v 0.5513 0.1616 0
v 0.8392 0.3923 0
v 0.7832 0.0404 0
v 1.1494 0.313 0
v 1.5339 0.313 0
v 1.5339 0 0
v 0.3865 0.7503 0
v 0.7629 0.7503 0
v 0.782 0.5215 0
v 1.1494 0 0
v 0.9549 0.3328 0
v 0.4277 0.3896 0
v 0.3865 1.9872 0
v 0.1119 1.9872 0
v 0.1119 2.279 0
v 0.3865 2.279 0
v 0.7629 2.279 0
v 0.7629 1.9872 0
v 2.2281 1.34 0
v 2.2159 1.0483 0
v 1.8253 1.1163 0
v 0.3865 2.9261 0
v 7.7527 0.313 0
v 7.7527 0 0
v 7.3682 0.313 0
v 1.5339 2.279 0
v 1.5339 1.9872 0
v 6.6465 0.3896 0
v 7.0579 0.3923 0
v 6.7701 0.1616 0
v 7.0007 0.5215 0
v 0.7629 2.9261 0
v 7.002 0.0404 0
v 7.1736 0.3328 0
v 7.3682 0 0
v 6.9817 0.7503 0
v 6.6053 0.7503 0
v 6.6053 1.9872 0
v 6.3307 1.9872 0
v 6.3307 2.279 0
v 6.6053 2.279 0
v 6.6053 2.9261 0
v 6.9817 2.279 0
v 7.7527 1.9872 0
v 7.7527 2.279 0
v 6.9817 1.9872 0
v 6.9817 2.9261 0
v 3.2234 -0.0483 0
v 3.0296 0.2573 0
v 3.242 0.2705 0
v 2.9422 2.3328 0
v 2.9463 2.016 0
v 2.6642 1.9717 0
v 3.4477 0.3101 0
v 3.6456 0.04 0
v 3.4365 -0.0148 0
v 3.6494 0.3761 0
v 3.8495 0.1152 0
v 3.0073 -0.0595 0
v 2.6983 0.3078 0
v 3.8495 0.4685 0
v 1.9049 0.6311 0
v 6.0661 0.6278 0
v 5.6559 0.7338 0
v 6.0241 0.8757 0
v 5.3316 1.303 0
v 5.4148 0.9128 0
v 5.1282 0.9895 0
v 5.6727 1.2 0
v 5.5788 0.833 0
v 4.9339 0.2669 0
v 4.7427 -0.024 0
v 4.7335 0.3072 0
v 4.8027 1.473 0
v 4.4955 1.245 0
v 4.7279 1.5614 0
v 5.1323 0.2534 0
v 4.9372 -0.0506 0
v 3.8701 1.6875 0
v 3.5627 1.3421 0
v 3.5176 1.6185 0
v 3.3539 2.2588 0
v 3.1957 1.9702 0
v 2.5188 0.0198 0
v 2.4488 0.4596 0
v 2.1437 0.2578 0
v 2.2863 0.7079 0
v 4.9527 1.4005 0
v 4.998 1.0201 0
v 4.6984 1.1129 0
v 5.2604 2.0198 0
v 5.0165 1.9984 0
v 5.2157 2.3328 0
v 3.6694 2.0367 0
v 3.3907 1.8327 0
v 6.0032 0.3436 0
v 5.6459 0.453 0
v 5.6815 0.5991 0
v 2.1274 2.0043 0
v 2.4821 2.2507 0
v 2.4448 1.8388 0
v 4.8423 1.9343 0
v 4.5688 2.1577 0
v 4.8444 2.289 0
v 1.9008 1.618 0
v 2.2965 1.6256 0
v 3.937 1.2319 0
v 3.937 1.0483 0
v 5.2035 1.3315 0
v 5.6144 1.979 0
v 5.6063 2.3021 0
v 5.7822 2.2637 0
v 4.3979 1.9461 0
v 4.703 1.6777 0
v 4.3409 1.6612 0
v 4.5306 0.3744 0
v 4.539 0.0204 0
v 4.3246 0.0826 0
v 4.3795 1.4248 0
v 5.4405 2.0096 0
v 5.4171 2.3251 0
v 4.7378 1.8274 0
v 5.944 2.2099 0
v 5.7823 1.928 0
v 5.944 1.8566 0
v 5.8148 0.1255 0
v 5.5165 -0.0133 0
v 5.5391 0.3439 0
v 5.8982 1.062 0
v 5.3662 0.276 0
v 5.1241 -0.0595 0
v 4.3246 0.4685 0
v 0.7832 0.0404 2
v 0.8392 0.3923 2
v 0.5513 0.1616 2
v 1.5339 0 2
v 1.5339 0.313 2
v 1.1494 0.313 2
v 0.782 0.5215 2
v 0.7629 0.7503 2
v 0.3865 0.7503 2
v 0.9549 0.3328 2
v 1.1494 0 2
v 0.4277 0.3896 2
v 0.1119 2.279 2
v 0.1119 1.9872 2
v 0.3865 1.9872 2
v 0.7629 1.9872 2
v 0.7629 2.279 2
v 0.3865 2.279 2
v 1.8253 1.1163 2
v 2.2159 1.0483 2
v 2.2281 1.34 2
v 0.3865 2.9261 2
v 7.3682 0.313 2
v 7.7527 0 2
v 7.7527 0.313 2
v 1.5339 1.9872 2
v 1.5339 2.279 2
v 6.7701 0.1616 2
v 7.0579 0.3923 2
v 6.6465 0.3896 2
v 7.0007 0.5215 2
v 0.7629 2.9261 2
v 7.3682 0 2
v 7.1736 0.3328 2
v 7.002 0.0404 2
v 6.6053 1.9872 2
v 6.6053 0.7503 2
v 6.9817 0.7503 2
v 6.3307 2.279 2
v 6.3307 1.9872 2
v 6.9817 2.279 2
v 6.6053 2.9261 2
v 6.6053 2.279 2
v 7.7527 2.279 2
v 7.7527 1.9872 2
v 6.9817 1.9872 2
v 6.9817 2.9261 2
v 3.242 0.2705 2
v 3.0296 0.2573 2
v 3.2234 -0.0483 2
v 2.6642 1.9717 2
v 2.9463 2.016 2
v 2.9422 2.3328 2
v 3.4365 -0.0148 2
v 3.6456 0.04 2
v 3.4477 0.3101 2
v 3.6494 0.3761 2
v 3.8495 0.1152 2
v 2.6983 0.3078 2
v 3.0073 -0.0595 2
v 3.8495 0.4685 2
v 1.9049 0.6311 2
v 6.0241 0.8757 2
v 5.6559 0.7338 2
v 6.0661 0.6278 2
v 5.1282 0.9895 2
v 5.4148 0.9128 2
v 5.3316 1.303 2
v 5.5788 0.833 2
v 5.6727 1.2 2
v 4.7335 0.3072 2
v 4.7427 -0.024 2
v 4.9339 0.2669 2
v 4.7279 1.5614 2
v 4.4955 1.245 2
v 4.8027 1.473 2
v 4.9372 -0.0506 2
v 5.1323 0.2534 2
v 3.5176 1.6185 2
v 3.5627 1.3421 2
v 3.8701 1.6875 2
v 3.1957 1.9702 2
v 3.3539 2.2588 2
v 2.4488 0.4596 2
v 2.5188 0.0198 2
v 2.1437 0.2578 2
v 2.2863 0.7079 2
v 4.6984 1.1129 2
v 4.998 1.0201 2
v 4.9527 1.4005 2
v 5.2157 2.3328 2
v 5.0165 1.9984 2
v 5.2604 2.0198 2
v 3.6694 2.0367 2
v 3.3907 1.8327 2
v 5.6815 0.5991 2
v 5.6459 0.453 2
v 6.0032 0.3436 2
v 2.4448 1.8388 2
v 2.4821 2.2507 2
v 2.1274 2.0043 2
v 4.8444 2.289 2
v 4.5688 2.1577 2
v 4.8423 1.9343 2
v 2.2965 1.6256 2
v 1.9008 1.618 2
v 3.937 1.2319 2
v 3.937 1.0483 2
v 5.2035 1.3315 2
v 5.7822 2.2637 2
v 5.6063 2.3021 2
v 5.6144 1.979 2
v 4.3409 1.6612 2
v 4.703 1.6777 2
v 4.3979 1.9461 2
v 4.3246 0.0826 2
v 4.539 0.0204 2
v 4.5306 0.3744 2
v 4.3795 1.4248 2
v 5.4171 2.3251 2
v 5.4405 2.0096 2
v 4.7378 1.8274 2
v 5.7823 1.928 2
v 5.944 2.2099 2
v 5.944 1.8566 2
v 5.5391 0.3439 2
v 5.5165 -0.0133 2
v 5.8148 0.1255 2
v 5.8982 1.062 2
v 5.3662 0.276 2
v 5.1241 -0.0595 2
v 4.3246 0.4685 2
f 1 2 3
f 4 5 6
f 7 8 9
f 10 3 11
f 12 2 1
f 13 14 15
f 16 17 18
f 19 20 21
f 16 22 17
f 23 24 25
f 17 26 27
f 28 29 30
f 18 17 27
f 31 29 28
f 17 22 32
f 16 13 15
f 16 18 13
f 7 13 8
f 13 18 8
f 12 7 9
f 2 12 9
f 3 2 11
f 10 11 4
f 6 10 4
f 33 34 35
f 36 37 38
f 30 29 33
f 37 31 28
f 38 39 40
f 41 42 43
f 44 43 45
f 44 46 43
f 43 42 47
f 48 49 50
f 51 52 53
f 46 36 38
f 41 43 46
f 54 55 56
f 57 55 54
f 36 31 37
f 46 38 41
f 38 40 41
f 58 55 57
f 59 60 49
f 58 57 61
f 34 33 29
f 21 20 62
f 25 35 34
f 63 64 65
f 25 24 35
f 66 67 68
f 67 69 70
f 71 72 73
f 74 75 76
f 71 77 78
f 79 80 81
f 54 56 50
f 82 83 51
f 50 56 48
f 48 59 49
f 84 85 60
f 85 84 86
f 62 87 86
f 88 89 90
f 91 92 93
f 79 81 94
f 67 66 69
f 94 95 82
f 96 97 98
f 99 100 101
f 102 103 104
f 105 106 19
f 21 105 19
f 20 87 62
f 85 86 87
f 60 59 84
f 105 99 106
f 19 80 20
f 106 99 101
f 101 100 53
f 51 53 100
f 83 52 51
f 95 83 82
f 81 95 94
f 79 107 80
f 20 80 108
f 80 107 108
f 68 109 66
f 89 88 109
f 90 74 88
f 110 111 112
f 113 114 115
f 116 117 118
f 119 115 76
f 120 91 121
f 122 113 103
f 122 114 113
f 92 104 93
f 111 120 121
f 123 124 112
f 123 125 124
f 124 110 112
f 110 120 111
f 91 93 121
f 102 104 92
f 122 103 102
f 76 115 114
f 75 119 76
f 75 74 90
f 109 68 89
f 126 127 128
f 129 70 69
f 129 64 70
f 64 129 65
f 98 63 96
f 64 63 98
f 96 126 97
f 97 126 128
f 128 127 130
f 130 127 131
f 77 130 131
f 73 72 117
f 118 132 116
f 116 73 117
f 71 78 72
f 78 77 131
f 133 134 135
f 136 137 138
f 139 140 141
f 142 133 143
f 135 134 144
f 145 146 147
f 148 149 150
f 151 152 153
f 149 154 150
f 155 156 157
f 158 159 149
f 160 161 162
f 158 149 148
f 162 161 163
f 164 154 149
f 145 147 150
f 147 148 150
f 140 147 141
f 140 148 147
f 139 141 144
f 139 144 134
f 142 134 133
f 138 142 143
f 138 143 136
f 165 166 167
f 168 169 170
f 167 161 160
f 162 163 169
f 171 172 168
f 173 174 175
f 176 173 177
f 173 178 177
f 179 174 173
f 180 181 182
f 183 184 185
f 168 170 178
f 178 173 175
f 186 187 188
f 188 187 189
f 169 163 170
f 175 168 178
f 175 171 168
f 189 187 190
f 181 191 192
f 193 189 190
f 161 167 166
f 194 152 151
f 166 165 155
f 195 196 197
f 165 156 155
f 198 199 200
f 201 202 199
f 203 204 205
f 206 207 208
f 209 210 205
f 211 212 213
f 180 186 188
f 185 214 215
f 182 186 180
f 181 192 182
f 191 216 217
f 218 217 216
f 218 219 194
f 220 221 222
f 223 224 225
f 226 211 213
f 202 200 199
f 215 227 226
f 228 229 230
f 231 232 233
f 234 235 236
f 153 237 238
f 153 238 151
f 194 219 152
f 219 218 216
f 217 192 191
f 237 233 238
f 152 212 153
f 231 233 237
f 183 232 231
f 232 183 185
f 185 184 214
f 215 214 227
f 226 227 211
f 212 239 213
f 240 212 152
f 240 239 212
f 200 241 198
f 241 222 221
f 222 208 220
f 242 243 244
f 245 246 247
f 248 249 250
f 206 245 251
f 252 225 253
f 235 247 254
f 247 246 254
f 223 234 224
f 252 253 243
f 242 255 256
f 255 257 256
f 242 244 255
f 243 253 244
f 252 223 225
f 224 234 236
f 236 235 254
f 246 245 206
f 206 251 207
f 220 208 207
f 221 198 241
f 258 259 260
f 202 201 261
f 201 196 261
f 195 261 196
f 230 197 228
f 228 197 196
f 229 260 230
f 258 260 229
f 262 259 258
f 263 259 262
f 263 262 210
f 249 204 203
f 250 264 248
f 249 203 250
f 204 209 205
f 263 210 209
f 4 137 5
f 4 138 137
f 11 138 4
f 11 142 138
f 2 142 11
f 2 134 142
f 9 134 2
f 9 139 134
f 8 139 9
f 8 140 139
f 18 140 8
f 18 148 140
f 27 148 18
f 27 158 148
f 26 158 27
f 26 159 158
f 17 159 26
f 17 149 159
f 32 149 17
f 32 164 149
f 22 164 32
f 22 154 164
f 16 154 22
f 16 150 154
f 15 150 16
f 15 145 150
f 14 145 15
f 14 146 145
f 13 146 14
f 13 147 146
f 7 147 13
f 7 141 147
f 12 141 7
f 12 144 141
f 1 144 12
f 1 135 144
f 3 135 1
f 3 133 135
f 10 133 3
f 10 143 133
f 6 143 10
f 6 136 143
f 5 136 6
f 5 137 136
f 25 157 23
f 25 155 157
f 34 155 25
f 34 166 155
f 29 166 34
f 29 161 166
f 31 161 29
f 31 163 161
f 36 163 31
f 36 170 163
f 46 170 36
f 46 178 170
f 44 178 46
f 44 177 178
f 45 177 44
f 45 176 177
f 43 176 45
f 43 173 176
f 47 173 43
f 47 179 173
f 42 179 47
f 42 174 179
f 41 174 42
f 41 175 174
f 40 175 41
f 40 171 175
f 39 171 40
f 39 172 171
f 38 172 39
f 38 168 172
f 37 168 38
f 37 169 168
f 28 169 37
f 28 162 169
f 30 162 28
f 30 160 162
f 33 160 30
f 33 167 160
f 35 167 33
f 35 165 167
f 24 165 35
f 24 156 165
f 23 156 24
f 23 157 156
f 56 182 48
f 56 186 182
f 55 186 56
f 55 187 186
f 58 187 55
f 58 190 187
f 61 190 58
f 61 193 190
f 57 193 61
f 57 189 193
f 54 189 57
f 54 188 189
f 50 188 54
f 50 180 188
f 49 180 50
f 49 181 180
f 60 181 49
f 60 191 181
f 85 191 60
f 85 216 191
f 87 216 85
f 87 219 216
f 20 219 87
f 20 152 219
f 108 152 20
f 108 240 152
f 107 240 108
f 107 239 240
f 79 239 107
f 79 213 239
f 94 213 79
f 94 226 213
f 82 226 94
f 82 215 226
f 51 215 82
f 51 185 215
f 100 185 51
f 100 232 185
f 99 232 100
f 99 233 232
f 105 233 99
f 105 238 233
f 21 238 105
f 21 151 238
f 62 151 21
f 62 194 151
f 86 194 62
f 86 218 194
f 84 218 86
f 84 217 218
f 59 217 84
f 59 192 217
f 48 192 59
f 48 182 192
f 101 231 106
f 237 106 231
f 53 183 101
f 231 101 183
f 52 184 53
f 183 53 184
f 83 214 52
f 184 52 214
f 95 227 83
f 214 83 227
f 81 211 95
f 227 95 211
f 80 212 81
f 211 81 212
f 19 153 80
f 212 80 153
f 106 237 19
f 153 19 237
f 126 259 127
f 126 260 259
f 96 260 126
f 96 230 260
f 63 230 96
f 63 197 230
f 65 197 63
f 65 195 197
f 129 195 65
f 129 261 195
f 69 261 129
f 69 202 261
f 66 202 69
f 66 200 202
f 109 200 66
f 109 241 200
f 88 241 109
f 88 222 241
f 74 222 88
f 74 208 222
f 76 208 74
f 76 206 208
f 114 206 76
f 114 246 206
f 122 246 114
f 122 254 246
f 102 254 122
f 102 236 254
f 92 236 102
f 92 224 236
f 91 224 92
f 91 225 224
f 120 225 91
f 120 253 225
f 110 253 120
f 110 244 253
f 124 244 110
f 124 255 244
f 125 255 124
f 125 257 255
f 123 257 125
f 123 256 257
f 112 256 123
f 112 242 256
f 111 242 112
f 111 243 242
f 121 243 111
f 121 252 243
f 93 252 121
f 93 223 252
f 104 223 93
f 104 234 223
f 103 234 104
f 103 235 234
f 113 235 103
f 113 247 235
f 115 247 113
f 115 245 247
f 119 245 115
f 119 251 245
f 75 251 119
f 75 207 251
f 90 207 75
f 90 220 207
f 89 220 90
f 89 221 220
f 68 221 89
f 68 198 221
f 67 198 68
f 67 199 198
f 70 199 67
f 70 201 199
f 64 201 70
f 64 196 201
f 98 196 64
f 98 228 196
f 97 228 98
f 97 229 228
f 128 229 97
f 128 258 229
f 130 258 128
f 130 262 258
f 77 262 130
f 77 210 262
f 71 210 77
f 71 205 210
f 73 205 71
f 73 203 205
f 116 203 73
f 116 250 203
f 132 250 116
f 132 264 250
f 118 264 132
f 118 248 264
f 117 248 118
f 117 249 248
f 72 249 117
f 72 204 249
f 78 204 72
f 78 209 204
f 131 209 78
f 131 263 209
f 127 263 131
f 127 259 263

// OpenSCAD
texte_a_inserer = "test"; 
taille = 3; 
police = "MrDeHaviland"; //[[Abril Fatface,Aclonica,Acme,Advent Pro,Akronim,Aladin,Alegreya,Alegreya Sans,Alegreya SC,Alex Brush,Alfa Slab One,Alice,Amaranth,Architects Daughter,Archivo Black,Archivo Narrow,Arimo,Arvo,Asap,Astloch,Asul,Averia Libre,Averia Serif Libre,Bangers,Basic,Belgrano,Berkshire Swash,Bigshot One,Bilbo Swash Caps,Black Ops One,Bonbon,Bowlby One SC,Brawler,Bubblegum Sans,Butterfly Kids,Cabin Condensed,Caesar Dressing,Cagliostro,Calligraffitti,Capriola,Carter One,Changa One,Chango,Chelsea Market,Cherry Cream Soda,Chewy,Chicle,Chivo,Clicker Script,Coming Soon,Concert One,Condiment,Cookie,Courgette,Covered By Your Grace,Crimson Text,Dancing Script,DejaVu Sans,DejaVu Serif,Dhurjati,Doppio One,Dosis,Droid Sans,Eagle Lake,Electrolize,Emilys Candy,Encode Sans,Encode Sans Compressed,Euphoria Script,Exo,Exo 2,Faster One,Federo,Finger Paint,Fjord One,Fontdiner Swanky,Freckle Face,Fruktur,Gabriela,Geo,Germania One,Give You Glory,Gloria Hallelujah,Goudy Bookletter 1911,Graduate,Grand Hotel,Great Vibes,Griffy,Hanalei Fill,Happy Monkey,Henny Penny,Hind,IM Fell English SC,Indie Flower,Irish Grover,Italianno,Jacques Francois Shadow,Jolly Lodger,Josefin Slab,Joti One,Judson,Just Another Hand,Kalam,Kameron,Karma,Kavoon,Knewave,Kranky,Kristi,Laila,Lakki Reddy,Lancelot,Lato,Leckerli One,Ledger,Lekton,Lemon One,Liberation Sans,Libre Caslon Text,Life Savers,Lilita One,Lily Script One,Limelight,Lobster,Lobster Two,Londrina Outline,Londrina Shadow,Londrina Solid,Lora,Love Ya Like A Sister,Loved by the King,Lovers Quarrel,Luckiest Guy,Lusitana,Macondo,Macondo Swash Caps,Mako,Marck Script,Margarine,Marko One,Maven Pro,McLaren,MedievalSharp,Merienda One,Merriweather,Mervale Script,Metal Mania,Metrophobic,Milonga,Miltonian Tattoo,Miss Fajardose,Molle,Montez,Montserrat,Mr De Haviland,Mystery Quest,Neucha,New Rocker,Niconne,Nosifer,Nothing You Could Do,Noto Sans Oriya,Noto Serif,Nova Square,Nunito,Old Standard TT,Oleo Script,Oleo Script Swash Caps,Orbitron,Oregano,Orienta,Original Surfer,Oswald,Over the Rainbow,Overlock,Oxygen,Pacifico,Paprika,Parisienne,Patrick Hand SC,Paytone One,Peralta,Permanent Marker,Piedra,Pirata One,Play,Playball,Poetsen One,Poppins,Press Start 2P,Princess Sofia,PT Mono,Qwigley,Racing Sans One,Raleway,Rancho,Ranga,Ribeye,Roboto,Roboto Condensed,Roboto Slab,Rochester,Rock Salt,Rubik One,Sail,Salsa,Sansita One,Sarina,Satisfy,Schoolbell,Seaweed Script,Sevillana,Shadows Into Light,Shadows Into Light Two,Share,Six Caps,Skranji,Source Sans Pro,Spicy Rice,Stardos Stencil,Stoke,Syncopate,Teko,Terminal Dosis,The Girl Next Door,Tillana,Timmana,Titillium Web,Ubuntu,Ultra,Underdog,UnifrakturCook,UnifrakturMaguntia,Vampiro One,Vidaloka,Viga,Voces,Volkhov,Vollkorn,Voltaire,Waiting for the Sunrise,Wallpoet,Wellfleet,Wendy One,Yellowtail,Yesteryear,Zeyada]]
hauteur = 2; 
module rendu(){
linear_extrude(hauteur) text(texte_a_inserer,size = taille, font = police);
}
rendu();
 
